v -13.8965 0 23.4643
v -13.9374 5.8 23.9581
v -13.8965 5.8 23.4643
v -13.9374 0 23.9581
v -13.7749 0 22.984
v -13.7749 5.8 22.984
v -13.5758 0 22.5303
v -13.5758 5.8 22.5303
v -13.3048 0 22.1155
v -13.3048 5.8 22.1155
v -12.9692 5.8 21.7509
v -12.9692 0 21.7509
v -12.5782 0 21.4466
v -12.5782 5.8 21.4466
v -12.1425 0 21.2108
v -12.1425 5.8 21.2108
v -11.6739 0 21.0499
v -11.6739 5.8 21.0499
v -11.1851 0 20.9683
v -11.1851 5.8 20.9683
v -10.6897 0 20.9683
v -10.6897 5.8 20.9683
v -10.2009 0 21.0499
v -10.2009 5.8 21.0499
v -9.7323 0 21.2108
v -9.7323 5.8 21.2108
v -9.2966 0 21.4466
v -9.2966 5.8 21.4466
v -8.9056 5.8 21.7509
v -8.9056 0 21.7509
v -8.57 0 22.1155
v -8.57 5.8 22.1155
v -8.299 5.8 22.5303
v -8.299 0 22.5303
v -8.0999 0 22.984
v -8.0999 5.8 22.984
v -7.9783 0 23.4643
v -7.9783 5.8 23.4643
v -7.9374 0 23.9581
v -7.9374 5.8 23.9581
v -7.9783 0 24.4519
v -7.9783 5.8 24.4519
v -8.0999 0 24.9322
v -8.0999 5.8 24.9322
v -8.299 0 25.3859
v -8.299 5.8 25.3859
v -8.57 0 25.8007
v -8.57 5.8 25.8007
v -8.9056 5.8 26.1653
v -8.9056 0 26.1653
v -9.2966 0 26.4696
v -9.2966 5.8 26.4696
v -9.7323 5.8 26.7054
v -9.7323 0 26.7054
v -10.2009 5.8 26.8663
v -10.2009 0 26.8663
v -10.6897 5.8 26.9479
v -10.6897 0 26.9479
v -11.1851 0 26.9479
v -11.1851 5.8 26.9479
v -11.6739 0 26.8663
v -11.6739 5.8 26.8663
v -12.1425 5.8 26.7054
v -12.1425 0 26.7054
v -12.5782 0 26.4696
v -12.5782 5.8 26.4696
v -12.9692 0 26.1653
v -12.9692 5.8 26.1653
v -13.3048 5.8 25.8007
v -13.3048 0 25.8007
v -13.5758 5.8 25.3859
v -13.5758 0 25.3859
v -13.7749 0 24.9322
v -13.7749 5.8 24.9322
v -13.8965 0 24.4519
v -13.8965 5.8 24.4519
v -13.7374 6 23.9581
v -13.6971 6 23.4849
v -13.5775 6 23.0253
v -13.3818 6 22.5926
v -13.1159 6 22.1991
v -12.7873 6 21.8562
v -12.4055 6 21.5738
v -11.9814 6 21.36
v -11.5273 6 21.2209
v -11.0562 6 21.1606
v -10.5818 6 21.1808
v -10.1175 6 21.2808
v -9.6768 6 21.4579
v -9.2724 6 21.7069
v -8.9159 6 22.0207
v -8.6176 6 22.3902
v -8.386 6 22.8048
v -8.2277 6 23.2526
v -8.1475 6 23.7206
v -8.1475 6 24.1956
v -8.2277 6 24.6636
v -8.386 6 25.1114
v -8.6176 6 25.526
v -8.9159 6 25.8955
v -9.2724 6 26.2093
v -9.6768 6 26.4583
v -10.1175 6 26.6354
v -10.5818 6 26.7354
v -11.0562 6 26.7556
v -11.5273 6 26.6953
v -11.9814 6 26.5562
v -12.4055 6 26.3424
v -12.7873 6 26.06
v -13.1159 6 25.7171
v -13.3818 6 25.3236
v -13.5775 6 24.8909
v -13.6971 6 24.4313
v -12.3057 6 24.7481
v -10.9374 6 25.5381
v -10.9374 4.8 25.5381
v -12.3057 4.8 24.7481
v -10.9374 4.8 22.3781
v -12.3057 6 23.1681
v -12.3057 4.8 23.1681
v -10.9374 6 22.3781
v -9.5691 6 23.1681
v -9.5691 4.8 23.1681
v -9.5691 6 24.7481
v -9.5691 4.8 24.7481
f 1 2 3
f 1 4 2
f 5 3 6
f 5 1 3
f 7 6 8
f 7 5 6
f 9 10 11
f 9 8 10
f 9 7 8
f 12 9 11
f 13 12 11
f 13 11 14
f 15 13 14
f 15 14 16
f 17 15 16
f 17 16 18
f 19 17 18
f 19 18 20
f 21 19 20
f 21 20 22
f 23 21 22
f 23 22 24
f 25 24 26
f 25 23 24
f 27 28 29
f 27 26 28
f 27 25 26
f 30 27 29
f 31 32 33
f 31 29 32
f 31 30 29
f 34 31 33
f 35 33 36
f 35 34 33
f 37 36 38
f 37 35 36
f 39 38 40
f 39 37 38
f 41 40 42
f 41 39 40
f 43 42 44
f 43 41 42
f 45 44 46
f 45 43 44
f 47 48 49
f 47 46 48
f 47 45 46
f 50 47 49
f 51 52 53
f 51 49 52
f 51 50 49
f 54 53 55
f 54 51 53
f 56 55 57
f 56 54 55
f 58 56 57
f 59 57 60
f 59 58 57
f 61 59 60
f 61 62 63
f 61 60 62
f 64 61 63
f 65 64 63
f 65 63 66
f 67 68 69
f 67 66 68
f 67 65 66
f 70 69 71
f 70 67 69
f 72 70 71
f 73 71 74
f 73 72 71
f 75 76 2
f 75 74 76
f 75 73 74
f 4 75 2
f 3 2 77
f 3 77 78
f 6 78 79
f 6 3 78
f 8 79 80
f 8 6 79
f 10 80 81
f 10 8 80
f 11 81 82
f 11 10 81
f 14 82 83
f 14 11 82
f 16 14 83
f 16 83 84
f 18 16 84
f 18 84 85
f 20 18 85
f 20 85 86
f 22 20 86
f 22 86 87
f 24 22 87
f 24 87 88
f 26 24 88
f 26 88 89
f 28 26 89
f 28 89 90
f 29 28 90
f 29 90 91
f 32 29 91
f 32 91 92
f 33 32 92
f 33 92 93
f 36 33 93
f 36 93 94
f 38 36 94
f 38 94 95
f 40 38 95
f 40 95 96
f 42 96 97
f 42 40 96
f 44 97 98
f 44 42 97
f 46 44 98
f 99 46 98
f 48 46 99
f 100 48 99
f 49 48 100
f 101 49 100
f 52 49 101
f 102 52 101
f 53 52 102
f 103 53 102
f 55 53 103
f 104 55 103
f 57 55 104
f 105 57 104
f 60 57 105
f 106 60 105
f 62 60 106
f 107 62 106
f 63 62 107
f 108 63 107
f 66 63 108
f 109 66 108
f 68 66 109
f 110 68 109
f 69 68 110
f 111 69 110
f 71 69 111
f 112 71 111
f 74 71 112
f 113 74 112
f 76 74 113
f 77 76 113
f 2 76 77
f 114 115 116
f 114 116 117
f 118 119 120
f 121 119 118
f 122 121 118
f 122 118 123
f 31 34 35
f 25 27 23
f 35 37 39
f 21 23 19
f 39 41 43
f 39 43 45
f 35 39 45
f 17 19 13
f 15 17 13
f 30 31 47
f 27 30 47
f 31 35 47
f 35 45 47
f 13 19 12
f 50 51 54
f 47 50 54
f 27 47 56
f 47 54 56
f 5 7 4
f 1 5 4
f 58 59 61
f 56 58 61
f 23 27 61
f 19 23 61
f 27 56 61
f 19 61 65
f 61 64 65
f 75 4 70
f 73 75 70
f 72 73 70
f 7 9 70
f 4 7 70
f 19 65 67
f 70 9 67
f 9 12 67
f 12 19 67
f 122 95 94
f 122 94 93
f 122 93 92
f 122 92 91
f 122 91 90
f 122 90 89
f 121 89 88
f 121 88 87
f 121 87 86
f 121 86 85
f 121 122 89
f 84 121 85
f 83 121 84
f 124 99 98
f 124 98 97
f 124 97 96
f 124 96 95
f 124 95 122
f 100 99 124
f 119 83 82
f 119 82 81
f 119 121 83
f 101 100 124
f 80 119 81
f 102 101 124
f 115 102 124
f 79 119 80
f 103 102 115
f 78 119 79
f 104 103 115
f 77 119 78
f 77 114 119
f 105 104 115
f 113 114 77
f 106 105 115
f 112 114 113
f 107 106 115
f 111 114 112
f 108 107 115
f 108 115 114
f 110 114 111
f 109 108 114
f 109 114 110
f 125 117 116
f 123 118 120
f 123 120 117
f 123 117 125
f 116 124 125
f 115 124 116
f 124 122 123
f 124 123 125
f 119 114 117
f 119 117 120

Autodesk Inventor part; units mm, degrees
ref_plane "YZ Plane" through (0, 0, 0) normal (1, 0, 0) x (0, 1, 0)
ref_plane "XZ Plane" through (0, 0, 0) normal (0, 1, 0) x (-1, 0, 0)
ref_plane "XY Plane" through (0, 0, 0) normal (0, 0, 1) x (1, 0, 0)
sketch "Boceto1" plane through (0, 0, 0) normal (0, 1, 0) x (-1, 0, 0)
  circle A0 centre (10.9374, 23.9581) radius 3
  point P0 (0, 0)
  dimension "d0" = 6
extrude "Extrusión1" add sketch "Boceto1" along normal blind 6
sketch "Boceto2" plane through (-10.9374, 6, 23.9581) normal (0, 1, 0) x (1, 0, 0)
  line L0 (0, 1.58) -> (1.3683, 0.79)
  line L1 (1.3683, 0.79) -> (1.3683, -0.79)
  line L2 (1.3683, -0.79) -> (0, -1.58)
  line L3 (0, -1.58) -> (-1.3683, -0.79)
  line L4 (-1.3683, -0.79) -> (-1.3683, 0.79)
  line L5 (-1.3683, 0.79) -> (0, 1.58)
  circle A0 centre (0, 0) radius 3 projected
  line L6 (-3, 0) -> (0, 0)
  point P0 (10.9374, 23.9581)
  dimension "d11" = 1.58
  dimension "d12" = 1.58
extrude "Extrusión2" cut sketch "Boceto2" against normal blind 1.2 contours L0 L1 L2 L3 L4 L5
thread "Thread2" size "M6x0.5" class "6g" standard "ISO Metric profile" length 7
chamfer "Chamfer1" distance 0.2 angle 45 1 edges at (-7.9374, 6, 23.9581)
properties part number "Tornillo Allen gusano M6 para Motor"
